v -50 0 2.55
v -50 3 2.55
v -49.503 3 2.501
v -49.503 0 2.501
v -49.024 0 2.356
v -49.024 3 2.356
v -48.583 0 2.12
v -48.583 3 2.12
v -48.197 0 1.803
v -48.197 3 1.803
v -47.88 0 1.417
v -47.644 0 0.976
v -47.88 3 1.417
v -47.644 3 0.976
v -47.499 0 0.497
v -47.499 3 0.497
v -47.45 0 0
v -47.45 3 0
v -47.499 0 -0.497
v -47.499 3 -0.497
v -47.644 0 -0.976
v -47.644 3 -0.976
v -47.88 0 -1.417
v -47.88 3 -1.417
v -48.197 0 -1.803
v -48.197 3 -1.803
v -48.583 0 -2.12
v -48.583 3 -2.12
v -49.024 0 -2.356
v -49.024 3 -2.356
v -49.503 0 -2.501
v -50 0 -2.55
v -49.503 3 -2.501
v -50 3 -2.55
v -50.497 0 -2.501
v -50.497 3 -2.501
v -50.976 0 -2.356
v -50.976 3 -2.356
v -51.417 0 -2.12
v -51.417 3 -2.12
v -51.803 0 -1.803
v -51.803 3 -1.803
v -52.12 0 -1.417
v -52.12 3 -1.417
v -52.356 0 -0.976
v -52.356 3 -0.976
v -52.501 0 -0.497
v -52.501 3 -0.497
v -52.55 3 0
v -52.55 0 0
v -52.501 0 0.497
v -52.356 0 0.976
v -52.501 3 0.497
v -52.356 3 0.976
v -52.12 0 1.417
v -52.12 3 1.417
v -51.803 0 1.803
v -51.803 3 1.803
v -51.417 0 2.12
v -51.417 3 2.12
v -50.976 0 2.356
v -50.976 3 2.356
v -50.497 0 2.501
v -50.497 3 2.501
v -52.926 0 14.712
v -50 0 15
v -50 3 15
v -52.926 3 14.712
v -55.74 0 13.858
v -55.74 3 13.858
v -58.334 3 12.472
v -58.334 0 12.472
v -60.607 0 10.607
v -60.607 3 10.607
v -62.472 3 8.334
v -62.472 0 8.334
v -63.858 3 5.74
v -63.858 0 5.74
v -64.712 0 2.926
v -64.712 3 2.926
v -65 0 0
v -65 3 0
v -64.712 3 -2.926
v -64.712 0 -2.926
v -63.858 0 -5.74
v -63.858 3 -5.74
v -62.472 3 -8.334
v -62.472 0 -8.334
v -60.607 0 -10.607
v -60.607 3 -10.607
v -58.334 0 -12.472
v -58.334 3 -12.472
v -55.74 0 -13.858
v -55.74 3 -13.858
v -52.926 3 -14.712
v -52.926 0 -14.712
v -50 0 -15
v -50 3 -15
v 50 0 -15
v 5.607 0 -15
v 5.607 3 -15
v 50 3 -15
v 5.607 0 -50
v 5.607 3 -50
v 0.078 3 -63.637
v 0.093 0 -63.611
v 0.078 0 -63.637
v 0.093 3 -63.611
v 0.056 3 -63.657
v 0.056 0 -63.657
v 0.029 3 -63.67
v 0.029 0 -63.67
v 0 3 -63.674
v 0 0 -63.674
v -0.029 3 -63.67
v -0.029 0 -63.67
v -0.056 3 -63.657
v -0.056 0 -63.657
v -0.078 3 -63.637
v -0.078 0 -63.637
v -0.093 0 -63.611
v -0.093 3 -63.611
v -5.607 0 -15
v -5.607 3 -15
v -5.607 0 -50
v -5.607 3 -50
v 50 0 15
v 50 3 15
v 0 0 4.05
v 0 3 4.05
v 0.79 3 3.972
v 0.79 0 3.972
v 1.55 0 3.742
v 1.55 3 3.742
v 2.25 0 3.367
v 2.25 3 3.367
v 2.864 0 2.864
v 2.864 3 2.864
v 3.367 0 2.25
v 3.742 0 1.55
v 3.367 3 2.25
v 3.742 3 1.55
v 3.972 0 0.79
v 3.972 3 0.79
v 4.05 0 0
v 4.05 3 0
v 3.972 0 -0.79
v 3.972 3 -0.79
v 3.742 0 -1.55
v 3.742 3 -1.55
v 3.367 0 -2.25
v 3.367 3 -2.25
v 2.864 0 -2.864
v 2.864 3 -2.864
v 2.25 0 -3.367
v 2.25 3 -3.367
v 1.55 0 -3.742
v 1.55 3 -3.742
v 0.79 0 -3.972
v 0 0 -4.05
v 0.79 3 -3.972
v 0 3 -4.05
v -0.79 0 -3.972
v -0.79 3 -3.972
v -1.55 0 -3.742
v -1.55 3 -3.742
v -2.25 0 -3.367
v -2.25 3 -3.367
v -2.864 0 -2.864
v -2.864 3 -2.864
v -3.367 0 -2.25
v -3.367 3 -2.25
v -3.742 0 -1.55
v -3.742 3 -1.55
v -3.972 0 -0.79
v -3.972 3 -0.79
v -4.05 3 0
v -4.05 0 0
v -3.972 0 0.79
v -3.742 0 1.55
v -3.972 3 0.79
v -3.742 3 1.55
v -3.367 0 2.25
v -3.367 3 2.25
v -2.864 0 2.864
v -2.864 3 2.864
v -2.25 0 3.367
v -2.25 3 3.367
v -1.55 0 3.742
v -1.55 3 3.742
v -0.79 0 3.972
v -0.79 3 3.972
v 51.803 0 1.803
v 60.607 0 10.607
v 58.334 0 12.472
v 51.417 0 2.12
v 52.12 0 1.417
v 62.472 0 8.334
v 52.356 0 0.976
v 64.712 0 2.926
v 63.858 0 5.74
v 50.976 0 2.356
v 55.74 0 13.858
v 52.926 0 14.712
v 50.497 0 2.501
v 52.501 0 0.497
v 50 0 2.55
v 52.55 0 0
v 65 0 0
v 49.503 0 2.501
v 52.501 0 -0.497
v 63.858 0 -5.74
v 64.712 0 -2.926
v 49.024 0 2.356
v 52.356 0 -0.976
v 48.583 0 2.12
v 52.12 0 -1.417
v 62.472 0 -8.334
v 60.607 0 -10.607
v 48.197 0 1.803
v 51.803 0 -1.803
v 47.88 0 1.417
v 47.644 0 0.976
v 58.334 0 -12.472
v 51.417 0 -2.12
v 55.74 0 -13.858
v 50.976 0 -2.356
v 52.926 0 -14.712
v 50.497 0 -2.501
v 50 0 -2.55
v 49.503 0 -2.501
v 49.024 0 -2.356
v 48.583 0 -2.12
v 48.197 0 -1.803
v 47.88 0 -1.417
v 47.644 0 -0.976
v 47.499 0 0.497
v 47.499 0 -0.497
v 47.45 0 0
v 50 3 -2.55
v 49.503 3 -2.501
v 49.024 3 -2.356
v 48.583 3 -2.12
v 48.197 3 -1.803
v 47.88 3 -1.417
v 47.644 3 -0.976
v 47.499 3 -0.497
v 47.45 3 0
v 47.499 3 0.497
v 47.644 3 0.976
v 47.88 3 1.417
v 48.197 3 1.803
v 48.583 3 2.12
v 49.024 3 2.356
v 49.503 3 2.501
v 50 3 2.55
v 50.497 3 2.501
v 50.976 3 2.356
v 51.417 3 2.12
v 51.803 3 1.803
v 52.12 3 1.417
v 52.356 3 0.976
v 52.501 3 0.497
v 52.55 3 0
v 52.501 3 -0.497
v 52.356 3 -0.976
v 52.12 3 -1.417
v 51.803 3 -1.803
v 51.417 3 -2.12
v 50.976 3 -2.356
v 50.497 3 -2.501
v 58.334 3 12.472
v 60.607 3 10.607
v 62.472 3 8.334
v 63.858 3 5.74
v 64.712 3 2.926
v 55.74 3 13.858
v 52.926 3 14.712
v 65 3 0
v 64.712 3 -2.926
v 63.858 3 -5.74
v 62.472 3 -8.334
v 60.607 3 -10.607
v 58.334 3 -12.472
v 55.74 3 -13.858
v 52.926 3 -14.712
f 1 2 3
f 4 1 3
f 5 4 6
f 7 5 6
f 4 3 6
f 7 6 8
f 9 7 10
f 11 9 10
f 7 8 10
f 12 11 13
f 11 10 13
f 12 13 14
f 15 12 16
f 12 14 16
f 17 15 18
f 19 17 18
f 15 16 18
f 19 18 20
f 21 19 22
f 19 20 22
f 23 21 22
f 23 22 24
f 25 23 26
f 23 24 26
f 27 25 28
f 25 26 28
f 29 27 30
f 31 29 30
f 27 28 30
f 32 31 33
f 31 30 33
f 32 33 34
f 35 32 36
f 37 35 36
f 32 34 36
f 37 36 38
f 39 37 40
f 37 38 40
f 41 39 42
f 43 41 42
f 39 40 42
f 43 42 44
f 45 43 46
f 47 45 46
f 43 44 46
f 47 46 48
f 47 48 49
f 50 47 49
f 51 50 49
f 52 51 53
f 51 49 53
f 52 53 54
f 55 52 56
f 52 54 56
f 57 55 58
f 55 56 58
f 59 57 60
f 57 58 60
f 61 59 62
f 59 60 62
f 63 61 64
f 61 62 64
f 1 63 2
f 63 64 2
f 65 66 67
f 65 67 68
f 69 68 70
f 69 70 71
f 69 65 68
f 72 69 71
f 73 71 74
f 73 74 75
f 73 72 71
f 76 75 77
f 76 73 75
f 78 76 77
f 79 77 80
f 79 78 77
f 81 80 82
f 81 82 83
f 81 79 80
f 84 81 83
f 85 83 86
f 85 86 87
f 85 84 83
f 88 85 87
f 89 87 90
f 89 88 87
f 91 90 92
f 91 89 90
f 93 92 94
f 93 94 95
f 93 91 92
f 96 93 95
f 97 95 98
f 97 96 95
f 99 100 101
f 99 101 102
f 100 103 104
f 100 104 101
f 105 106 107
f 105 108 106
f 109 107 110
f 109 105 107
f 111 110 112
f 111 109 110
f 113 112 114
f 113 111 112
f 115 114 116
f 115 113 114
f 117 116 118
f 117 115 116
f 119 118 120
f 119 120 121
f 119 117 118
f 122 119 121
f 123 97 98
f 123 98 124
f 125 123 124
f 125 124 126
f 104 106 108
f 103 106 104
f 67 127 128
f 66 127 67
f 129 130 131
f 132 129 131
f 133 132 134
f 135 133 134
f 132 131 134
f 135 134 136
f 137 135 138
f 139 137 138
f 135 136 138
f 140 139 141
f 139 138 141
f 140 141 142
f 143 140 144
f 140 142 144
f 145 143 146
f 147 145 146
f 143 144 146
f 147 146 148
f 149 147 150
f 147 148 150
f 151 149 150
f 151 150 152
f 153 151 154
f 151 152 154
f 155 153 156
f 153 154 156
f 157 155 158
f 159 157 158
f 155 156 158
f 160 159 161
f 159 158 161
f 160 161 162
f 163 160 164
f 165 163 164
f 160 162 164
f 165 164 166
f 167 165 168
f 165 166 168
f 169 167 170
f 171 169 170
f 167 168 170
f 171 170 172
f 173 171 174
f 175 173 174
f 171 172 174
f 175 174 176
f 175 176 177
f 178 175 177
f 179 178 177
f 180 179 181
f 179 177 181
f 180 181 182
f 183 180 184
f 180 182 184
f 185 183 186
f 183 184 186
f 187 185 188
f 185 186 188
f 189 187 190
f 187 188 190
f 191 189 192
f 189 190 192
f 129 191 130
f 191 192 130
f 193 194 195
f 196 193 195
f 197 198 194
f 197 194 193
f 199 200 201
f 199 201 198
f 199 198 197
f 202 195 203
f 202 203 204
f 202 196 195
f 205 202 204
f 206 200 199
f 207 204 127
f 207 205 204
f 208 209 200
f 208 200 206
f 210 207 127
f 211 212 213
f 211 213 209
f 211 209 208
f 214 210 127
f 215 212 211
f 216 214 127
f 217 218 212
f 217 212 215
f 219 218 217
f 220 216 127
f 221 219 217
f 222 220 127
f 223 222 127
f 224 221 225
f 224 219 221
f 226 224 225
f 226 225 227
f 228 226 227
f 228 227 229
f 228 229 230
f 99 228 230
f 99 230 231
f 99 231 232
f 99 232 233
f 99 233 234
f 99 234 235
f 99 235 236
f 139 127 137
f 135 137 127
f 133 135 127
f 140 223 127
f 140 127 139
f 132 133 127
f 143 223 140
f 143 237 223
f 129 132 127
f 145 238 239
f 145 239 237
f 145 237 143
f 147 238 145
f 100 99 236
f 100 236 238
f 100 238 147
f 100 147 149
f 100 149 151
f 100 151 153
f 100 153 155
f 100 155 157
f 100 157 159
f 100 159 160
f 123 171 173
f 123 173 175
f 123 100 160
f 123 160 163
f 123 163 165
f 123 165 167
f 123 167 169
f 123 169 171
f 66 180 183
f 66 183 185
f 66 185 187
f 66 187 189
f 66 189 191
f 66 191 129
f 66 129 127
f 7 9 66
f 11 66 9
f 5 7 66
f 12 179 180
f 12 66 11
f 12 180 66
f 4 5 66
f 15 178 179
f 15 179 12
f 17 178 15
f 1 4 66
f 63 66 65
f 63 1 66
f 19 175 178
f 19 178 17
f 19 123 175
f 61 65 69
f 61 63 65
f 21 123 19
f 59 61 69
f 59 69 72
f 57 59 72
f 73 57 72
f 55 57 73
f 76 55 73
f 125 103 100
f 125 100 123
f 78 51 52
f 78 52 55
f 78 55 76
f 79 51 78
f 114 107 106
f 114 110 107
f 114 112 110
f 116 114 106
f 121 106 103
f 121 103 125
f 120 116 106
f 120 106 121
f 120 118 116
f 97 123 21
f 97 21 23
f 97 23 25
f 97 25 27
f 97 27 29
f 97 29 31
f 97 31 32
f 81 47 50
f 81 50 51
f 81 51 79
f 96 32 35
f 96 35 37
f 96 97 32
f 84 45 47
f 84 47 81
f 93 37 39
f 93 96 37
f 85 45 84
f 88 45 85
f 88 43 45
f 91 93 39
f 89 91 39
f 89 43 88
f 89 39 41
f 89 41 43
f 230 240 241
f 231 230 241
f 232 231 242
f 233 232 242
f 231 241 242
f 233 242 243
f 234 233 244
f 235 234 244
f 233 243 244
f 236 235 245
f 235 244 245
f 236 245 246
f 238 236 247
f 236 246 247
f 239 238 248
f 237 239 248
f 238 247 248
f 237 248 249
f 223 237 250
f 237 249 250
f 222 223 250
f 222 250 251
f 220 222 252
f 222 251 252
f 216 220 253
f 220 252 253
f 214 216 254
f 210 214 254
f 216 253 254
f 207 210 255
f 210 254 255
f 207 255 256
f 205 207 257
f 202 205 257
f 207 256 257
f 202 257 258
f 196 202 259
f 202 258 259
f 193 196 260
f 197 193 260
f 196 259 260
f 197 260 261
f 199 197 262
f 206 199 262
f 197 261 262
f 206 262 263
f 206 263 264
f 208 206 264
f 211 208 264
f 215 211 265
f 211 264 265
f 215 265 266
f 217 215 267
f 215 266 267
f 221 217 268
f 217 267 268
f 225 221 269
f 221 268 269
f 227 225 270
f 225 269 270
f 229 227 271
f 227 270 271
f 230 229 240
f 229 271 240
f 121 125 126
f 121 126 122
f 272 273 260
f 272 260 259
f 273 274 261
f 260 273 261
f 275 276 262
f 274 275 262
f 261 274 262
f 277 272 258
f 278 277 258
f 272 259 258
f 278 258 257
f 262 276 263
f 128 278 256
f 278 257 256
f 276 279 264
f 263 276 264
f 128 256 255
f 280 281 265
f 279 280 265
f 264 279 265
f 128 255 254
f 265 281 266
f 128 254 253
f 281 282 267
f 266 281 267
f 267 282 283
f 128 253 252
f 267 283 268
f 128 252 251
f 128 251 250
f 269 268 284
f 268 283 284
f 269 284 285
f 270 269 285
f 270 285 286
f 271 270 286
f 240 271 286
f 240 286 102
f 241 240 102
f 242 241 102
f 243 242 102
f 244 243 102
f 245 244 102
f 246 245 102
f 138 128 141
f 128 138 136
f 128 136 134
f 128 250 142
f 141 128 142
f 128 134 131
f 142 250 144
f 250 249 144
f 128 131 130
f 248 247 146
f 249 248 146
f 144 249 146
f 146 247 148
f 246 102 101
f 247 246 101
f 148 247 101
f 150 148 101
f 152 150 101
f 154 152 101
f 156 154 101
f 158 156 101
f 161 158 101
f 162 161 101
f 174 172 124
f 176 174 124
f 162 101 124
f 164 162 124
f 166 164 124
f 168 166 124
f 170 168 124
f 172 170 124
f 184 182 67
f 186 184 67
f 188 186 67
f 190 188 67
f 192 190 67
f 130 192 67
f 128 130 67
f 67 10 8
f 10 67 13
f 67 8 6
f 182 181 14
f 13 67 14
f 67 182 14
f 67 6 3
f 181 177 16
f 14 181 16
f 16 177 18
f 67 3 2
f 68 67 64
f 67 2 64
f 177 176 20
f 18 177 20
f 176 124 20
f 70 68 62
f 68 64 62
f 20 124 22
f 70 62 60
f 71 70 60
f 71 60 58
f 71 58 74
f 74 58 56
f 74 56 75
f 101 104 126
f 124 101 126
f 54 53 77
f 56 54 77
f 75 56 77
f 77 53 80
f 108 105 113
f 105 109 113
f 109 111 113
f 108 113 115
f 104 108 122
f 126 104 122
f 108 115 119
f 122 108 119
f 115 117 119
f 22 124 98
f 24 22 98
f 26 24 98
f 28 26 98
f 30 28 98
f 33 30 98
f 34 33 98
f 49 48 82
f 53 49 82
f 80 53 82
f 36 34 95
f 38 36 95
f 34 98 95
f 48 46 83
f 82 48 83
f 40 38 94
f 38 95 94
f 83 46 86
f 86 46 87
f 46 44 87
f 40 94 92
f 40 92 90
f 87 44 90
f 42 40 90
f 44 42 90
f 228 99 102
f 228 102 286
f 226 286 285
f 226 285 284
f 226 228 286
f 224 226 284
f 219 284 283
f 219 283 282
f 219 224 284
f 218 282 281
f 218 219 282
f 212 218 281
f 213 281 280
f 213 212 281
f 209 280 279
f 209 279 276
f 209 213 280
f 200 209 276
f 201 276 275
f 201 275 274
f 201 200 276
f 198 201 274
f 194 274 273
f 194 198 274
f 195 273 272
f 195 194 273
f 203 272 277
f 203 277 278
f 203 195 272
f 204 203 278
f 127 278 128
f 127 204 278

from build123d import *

# Parameters (mm, degrees)
BOSS_EXTRUDE1_DEPTH = 3
SKETCH2_R           = 4.05
SKETCH2_R_2         = 2.55
CUT_EXTRUDE1_DEPTH  = 3
FILLET1_R           = 0.1


with BuildPart() as part:
    # Sketch1 → Boss-Extrude1 (new body)
    with BuildSketch(Plane(origin=(0, 0, 0), x_dir=(1, 0, 0), z_dir=(0, 1, 0))):
        with BuildLine():
            Line((50, -15), (-50, -15))
            ThreePointArc((-50, -15), (-65, 0), (-50, 15))
            Line((-50, 15), (-5.606634193, 15))
            Line((-5.606634193, 15), (-5.606634193, 50))
            Line((-5.606634193, 50), (0, 63.840242005))
            Line((0, 63.840242005), (5.606634193, 50))
            Line((5.606634193, 50), (5.606634193, 15))
            Line((5.606634193, 15), (50, 15))
            ThreePointArc((50, 15), (65, 0), (50, -15))
        make_face()
    extrude(amount=BOSS_EXTRUDE1_DEPTH)

    # Sketch2 → Cut-Extrude1 (cut)
    with BuildSketch(Plane(origin=(0, 3, 0), x_dir=(1, 0, 0), z_dir=(0, 1, 0))):
        with Locations(Location((0, 0, 0), (0, 0, 270))):
            Circle(SKETCH2_R)
        with Locations(Location((-50, 0, 0), (0, 0, 270))):
            Circle(SKETCH2_R_2)
        with Locations(Location((50, 0, 0), (0, 0, 90))):
            Circle(SKETCH2_R_2)
    extrude(amount=-CUT_EXTRUDE1_DEPTH, mode=Mode.SUBTRACT)

    # Fillet1
    fillet1_edges = [part.edges().sort_by_distance(p)[0] for p in [
        (0, 1.5, -63.840242005),
    ]]
    fillet(fillet1_edges, radius=FILLET1_R)


solid = part.part
